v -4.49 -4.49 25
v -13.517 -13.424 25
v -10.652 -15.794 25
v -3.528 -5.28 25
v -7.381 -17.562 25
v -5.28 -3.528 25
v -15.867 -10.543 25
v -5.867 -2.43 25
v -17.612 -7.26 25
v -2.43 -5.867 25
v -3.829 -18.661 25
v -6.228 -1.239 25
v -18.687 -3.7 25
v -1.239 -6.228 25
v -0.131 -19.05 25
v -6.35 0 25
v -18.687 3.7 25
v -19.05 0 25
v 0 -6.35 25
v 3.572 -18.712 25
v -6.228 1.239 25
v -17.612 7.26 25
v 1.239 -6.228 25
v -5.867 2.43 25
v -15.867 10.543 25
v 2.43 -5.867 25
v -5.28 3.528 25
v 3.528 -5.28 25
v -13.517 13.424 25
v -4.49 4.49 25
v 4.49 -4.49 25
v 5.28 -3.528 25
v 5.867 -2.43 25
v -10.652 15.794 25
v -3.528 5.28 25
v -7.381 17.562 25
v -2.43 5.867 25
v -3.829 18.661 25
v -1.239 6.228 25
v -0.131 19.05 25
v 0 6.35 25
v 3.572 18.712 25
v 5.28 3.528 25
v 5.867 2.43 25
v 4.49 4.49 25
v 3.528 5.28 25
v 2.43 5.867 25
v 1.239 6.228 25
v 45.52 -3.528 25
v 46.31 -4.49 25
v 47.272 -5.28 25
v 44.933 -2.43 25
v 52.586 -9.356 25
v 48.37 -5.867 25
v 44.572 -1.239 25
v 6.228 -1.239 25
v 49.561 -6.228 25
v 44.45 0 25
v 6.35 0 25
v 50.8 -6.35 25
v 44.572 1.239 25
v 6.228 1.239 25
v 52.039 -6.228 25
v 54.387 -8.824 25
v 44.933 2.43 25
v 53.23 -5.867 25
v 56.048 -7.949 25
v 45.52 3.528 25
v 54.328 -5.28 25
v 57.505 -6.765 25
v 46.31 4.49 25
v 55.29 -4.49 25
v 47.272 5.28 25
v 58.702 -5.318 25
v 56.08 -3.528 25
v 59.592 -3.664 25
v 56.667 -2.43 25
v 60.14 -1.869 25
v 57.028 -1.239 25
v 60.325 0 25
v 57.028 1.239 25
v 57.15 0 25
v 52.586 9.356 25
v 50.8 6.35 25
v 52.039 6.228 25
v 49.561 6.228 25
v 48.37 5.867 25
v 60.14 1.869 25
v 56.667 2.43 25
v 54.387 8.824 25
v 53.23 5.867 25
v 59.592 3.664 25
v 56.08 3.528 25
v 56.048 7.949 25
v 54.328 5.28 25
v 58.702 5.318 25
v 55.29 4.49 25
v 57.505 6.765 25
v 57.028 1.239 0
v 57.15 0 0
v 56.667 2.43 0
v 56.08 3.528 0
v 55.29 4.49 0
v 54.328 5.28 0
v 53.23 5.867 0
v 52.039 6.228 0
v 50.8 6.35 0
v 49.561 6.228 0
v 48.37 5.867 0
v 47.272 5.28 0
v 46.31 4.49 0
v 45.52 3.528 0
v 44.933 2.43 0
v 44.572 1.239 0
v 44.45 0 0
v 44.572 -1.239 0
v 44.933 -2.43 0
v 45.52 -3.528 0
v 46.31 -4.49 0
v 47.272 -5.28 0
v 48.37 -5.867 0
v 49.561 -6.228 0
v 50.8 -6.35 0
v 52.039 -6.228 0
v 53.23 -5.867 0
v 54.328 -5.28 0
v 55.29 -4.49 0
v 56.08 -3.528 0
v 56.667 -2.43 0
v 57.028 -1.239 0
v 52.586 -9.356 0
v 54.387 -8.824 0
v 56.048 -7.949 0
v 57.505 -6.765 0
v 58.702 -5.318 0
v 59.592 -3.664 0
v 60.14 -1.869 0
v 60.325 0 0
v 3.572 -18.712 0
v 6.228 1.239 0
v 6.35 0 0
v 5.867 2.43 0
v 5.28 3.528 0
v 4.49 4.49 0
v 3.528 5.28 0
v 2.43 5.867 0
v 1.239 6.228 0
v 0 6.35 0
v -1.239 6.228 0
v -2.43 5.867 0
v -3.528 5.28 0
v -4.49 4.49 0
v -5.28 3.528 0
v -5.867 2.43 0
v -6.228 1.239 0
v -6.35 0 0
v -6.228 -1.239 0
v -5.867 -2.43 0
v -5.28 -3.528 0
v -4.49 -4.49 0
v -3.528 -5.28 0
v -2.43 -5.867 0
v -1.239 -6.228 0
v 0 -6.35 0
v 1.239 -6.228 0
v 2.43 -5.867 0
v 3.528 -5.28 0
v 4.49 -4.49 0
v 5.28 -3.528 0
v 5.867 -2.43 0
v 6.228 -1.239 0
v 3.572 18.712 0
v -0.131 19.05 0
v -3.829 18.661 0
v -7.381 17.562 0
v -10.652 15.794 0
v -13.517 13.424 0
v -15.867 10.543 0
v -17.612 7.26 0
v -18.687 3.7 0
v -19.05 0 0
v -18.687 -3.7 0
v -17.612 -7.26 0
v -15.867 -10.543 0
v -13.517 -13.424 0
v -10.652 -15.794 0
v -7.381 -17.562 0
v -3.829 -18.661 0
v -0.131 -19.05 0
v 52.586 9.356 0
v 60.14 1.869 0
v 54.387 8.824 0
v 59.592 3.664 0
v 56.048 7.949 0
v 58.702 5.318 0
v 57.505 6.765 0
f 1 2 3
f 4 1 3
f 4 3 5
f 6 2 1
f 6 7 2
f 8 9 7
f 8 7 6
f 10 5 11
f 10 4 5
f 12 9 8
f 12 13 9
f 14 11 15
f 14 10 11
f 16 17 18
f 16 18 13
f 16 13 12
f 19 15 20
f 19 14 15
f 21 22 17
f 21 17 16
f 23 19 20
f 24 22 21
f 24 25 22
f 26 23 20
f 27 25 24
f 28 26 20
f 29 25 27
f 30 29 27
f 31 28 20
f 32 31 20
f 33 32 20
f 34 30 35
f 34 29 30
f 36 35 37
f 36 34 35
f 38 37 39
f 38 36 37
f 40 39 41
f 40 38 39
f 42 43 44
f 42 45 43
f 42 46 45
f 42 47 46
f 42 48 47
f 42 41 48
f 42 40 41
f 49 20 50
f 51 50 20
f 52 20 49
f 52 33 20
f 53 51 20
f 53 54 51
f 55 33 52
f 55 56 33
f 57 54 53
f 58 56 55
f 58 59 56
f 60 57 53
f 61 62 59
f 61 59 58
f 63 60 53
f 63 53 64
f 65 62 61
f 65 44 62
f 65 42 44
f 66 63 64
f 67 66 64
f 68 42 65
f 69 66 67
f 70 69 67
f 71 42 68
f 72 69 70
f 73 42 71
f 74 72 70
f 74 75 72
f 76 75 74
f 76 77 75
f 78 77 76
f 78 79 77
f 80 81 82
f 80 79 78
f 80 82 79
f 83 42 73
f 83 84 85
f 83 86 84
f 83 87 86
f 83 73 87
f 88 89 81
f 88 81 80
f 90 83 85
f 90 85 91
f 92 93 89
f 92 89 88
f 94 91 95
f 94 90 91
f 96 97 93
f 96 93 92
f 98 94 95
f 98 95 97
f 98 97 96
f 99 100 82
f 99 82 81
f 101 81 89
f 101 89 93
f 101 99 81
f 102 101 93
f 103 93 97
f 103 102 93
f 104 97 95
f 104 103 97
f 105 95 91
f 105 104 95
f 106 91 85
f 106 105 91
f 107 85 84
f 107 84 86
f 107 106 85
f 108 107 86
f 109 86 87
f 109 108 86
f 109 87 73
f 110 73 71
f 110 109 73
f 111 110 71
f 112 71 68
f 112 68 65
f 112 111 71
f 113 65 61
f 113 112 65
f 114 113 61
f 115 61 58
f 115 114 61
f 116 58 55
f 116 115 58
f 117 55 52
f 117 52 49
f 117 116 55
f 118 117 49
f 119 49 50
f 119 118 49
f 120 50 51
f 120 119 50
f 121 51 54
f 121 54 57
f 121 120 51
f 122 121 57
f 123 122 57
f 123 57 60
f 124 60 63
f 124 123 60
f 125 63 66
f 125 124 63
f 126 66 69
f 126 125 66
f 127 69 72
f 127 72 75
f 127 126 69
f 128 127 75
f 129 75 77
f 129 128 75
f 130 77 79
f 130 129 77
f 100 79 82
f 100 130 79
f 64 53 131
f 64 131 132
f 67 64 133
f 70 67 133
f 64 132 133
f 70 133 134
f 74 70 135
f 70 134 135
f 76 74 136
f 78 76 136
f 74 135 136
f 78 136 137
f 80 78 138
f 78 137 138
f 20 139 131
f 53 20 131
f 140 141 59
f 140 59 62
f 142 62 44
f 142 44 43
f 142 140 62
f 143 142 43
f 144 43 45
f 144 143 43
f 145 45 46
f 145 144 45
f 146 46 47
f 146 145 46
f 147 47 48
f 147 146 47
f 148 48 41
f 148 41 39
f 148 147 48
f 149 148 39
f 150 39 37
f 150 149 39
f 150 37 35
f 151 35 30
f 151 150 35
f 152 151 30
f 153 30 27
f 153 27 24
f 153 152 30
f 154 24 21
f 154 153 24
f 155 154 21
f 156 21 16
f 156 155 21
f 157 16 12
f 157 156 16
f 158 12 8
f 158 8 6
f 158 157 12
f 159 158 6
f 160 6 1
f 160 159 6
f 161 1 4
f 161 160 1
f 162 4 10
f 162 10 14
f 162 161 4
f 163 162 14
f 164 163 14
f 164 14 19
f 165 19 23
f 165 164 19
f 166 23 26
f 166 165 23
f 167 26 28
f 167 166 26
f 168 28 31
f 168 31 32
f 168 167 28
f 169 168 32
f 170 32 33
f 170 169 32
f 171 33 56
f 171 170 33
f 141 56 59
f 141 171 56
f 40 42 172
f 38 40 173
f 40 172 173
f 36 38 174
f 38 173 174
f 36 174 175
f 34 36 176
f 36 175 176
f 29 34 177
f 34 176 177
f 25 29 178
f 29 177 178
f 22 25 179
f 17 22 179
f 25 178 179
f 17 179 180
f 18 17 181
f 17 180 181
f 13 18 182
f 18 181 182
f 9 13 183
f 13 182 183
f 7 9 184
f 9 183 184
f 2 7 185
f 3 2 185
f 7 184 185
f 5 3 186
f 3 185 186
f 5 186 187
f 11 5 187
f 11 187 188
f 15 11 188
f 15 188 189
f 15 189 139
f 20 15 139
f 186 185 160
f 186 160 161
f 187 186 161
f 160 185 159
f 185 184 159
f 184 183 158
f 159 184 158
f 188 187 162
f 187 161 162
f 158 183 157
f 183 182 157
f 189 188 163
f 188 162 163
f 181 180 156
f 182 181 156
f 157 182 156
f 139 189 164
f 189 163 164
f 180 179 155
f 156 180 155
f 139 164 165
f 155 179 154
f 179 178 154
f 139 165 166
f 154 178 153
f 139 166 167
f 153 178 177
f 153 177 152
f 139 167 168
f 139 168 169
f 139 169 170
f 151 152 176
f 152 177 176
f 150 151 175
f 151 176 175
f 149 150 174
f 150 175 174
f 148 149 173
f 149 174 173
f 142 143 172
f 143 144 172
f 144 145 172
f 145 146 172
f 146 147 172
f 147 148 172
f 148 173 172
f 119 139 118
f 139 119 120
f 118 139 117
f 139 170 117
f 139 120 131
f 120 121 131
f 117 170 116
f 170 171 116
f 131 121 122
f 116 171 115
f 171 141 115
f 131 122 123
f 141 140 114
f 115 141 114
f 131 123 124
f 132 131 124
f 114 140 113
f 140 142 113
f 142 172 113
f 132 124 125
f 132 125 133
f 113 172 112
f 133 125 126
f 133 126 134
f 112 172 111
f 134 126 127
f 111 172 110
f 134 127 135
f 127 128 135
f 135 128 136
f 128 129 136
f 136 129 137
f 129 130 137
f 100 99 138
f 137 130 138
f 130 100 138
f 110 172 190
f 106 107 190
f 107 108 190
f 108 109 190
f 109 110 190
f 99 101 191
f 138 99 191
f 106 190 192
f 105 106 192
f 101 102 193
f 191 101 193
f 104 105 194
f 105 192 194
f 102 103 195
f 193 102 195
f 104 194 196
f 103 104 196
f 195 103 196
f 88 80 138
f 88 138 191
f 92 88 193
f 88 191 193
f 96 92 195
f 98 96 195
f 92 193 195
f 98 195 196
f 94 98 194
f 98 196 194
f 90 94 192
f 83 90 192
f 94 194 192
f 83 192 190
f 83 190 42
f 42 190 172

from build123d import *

# Parameters (mm, degrees)
F0_R     = 6.35
F1_DEPTH = 25


with BuildPart() as f1:
    # F0 (on Top) → F1 (new body)
    with BuildSketch(Plane.XY):
        with BuildLine():
            ThreePointArc((60.325, 0), (58.139505, 6.07102), (52.585938, 9.35607))
            ThreePointArc((52.585938, 9.35607), (41.275, 0), (52.585938, -9.35607))
            ThreePointArc((52.585938, -9.35607), (58.139505, -6.07102), (60.325, 0))
        make_face()
        with Locations((50.8, 0)):
            Circle(F0_R, mode=Mode.SUBTRACT)
        with BuildLine():
            ThreePointArc((3.571875, 18.712141), (14.679011, 12.14204), (19.05, 0))
            ThreePointArc((19.05, 0), (14.679011, -12.14204), (3.571875, -18.712141))
            Line((3.571875, -18.712141), (52.585938, -9.35607))
            ThreePointArc((52.585938, -9.35607), (41.275, 0), (52.585938, 9.35607))
            Line((52.585938, 9.35607), (3.571875, 18.712141))
        make_face()
        with BuildLine():
            ThreePointArc((3.571875, -18.712141), (14.679011, -12.14204), (19.05, 0))
            ThreePointArc((19.05, 0), (14.679011, 12.14204), (3.571875, 18.712141))
            ThreePointArc((3.571875, 18.712141), (-19.05, 0), (3.571875, -18.712141))
        make_face()
        Circle(F0_R, mode=Mode.SUBTRACT)
    extrude(amount=F1_DEPTH)


solid = f1.part
